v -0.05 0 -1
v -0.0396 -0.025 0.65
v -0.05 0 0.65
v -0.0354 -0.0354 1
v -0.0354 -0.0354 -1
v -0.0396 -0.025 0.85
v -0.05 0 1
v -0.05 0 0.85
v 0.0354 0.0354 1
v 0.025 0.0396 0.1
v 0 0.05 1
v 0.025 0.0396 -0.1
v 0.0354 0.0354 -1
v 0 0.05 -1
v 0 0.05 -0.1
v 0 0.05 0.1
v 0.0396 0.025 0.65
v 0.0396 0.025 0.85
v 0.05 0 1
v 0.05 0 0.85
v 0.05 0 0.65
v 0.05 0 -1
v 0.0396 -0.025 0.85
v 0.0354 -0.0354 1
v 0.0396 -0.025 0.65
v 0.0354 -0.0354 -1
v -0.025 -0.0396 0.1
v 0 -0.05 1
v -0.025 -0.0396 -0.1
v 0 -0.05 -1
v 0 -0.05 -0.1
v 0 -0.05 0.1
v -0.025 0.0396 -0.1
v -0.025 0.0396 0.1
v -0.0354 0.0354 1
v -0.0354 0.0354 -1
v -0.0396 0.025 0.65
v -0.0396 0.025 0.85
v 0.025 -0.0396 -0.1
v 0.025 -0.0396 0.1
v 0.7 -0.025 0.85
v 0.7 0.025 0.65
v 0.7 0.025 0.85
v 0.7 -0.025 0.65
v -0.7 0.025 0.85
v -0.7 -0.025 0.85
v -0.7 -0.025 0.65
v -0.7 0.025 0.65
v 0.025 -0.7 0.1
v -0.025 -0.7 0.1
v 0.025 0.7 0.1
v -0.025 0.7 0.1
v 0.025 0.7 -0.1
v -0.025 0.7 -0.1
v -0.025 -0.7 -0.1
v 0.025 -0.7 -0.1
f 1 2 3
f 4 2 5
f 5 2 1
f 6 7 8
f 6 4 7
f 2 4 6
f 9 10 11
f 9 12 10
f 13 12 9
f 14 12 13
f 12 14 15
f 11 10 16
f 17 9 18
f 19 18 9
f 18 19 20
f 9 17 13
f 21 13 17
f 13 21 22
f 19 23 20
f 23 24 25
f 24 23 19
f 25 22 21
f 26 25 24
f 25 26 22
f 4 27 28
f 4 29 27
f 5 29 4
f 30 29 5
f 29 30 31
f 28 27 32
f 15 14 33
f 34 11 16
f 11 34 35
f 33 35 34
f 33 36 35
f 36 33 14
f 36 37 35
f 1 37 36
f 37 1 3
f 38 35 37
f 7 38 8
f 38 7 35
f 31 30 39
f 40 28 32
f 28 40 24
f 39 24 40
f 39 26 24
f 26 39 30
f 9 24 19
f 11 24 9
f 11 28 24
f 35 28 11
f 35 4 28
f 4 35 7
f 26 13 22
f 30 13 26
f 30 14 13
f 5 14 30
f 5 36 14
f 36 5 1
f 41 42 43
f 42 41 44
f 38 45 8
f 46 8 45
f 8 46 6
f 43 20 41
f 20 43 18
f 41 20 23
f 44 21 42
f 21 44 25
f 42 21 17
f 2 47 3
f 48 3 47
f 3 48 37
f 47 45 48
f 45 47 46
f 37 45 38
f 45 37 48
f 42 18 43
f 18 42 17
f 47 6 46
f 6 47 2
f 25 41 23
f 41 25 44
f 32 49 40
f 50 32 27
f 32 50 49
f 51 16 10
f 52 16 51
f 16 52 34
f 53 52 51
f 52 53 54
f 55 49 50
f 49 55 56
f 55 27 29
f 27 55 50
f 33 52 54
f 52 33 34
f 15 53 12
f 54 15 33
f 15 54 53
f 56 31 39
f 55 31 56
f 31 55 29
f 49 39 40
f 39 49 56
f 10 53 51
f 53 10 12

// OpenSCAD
use <lib.scad>

hd = 64;
ld = 16;
vld = 8;

module flangeHD() {
	cyl(0.25,0.25,0.1);
}

module epipe() {
	x=0.65;
	z=2.6;
	points = [
		[x,0,-1],
		[x,0,(z-0.2)],
		[(x-0.07),0,(z-0.07)],
		[(x-0.2),0,z],
		[-(x-0.2),0,z],
		[-(x-0.07),0,(z-0.07)],
		[-x,0,(z-0.2)],
		[-x,0,-1],
	];
	rotate([0,0,90]) difference() {
		union() {
			pipe(points, 0.2);
			translate([-x,0,(z-0.3)]) flangeHD();
			translate([-(x-0.2),0,z]) rotate([0,90,0]) flangeHD();
			translate([x,0,(z-0.3)]) flangeHD();
			translate([(x-0.2),0,z]) rotate([0,90,0]) flangeHD();
		}
		translate([-0.5,0,-0.9]) box([1,1,1]);
		translate([0.5,0,0]) box([1,1,4]);
	}
}

module pipeHD($fn=hd/2) {
	translate([-0.45,-0.45,0]) rotate([0,0,-45]) epipe();
}

module pipeLD($fn=ld/2) {
	translate([-0.45,-0.45,0]) rotate([0,0,-45]) epipe();
}

module storageTankHD($fn=hd) {
	hull() {
		translate([0,0,2]) torus(0.25,0.45);
		translate([0,0,-0.25]) torus(0.25,0.45);
	}
}

module storageTankLD($fn=ld) {
	hull() {
		translate([0,0,2]) torus(0.25,0.45);
		translate([0,0,-0.25]) torus(0.25,0.45);
	}
}

module storageTankVLD($fn=vld) {
	hull() {
		translate([0,0,2]) torus(0.25,0.45);
		translate([0,0,-0.25]) torus(0.25,0.45);
	}
}

module mixingTankLD($fn=hd) {
	translate([0,0,0.25]) difference() {
		box([1.8,4,1.5]);
		translate([0,0,0.1]) box([1.6,3.8,1.5]);
	}
}

module mixingTankHD($fn=hd) {
	minkowskiOutsideRound(0.01,$fn=8)
	mixingTankLD();
}

module mixingTankVLD($fn=hd) {
	hull()
	mixingTankLD();
}

module mixingTankFluidHD($fn=hd) {
	#translate([0,0,0.25]) box([1.6,3.8,1.3]);
}

module agitatorHD($fn=hd) {
	union() {
		cyl(0.05,0.05,2,$fn=8);
		translate([0,0,0.75]) box([1.4,0.05,0.2]);
		translate([0,0,0]) rotate([0,0,90]) box([1.4,0.05,0.2]);
	}
}

module baseLD($fn=ld) {
	 difference() {
		hull() {
			translate([0,0,-1]) box([5.95, 5.95, 1]);
			translate([0,0,0]) box([5, 5, 0.1]);
		}
		translate([0,0,0.1]) box([4.75, 4.75, 1]);
	}
}

module baseHD($fn=hd) {
	minkowskiOutsideRound(0.01,$fn=8)
	baseLD();
}

module baseVLD($fn=ld) {
	union() {
		hull() baseLD();
		hull() for (i = [-2:1:2])
			translate([0,-i,0]) frameHD();
	}
}

module entity() {
	baseLD();
	translate([-1,-1,0]) storageTankHD();
	translate([-1,-1,0]) pipeHD();
	translate([-1,1,0]) storageTankHD();
	translate([-1,1,0]) pipeHD();
	translate([1.15,0,0]) mixingTankHD();
	translate([1.15,0,0]) mixingTankFluidHD();
	translate([1.15,1,0]) agitatorHD();
	translate([1.15,-1,0]) agitatorHD();
}

//translate([0,0,1.5]) entity();

//baseHD();
//baseLD();
//baseVLD();

//storageTankHD();
//storageTankLD();
//storageTankVLD();

//pipeHD();
//pipeLD();

//mixingTankHD();
//mixingTankLD();
//mixingTankVLD();

//mixingTankFluidHD();

agitatorHD();

//%box([5.95,5.95,3]);
